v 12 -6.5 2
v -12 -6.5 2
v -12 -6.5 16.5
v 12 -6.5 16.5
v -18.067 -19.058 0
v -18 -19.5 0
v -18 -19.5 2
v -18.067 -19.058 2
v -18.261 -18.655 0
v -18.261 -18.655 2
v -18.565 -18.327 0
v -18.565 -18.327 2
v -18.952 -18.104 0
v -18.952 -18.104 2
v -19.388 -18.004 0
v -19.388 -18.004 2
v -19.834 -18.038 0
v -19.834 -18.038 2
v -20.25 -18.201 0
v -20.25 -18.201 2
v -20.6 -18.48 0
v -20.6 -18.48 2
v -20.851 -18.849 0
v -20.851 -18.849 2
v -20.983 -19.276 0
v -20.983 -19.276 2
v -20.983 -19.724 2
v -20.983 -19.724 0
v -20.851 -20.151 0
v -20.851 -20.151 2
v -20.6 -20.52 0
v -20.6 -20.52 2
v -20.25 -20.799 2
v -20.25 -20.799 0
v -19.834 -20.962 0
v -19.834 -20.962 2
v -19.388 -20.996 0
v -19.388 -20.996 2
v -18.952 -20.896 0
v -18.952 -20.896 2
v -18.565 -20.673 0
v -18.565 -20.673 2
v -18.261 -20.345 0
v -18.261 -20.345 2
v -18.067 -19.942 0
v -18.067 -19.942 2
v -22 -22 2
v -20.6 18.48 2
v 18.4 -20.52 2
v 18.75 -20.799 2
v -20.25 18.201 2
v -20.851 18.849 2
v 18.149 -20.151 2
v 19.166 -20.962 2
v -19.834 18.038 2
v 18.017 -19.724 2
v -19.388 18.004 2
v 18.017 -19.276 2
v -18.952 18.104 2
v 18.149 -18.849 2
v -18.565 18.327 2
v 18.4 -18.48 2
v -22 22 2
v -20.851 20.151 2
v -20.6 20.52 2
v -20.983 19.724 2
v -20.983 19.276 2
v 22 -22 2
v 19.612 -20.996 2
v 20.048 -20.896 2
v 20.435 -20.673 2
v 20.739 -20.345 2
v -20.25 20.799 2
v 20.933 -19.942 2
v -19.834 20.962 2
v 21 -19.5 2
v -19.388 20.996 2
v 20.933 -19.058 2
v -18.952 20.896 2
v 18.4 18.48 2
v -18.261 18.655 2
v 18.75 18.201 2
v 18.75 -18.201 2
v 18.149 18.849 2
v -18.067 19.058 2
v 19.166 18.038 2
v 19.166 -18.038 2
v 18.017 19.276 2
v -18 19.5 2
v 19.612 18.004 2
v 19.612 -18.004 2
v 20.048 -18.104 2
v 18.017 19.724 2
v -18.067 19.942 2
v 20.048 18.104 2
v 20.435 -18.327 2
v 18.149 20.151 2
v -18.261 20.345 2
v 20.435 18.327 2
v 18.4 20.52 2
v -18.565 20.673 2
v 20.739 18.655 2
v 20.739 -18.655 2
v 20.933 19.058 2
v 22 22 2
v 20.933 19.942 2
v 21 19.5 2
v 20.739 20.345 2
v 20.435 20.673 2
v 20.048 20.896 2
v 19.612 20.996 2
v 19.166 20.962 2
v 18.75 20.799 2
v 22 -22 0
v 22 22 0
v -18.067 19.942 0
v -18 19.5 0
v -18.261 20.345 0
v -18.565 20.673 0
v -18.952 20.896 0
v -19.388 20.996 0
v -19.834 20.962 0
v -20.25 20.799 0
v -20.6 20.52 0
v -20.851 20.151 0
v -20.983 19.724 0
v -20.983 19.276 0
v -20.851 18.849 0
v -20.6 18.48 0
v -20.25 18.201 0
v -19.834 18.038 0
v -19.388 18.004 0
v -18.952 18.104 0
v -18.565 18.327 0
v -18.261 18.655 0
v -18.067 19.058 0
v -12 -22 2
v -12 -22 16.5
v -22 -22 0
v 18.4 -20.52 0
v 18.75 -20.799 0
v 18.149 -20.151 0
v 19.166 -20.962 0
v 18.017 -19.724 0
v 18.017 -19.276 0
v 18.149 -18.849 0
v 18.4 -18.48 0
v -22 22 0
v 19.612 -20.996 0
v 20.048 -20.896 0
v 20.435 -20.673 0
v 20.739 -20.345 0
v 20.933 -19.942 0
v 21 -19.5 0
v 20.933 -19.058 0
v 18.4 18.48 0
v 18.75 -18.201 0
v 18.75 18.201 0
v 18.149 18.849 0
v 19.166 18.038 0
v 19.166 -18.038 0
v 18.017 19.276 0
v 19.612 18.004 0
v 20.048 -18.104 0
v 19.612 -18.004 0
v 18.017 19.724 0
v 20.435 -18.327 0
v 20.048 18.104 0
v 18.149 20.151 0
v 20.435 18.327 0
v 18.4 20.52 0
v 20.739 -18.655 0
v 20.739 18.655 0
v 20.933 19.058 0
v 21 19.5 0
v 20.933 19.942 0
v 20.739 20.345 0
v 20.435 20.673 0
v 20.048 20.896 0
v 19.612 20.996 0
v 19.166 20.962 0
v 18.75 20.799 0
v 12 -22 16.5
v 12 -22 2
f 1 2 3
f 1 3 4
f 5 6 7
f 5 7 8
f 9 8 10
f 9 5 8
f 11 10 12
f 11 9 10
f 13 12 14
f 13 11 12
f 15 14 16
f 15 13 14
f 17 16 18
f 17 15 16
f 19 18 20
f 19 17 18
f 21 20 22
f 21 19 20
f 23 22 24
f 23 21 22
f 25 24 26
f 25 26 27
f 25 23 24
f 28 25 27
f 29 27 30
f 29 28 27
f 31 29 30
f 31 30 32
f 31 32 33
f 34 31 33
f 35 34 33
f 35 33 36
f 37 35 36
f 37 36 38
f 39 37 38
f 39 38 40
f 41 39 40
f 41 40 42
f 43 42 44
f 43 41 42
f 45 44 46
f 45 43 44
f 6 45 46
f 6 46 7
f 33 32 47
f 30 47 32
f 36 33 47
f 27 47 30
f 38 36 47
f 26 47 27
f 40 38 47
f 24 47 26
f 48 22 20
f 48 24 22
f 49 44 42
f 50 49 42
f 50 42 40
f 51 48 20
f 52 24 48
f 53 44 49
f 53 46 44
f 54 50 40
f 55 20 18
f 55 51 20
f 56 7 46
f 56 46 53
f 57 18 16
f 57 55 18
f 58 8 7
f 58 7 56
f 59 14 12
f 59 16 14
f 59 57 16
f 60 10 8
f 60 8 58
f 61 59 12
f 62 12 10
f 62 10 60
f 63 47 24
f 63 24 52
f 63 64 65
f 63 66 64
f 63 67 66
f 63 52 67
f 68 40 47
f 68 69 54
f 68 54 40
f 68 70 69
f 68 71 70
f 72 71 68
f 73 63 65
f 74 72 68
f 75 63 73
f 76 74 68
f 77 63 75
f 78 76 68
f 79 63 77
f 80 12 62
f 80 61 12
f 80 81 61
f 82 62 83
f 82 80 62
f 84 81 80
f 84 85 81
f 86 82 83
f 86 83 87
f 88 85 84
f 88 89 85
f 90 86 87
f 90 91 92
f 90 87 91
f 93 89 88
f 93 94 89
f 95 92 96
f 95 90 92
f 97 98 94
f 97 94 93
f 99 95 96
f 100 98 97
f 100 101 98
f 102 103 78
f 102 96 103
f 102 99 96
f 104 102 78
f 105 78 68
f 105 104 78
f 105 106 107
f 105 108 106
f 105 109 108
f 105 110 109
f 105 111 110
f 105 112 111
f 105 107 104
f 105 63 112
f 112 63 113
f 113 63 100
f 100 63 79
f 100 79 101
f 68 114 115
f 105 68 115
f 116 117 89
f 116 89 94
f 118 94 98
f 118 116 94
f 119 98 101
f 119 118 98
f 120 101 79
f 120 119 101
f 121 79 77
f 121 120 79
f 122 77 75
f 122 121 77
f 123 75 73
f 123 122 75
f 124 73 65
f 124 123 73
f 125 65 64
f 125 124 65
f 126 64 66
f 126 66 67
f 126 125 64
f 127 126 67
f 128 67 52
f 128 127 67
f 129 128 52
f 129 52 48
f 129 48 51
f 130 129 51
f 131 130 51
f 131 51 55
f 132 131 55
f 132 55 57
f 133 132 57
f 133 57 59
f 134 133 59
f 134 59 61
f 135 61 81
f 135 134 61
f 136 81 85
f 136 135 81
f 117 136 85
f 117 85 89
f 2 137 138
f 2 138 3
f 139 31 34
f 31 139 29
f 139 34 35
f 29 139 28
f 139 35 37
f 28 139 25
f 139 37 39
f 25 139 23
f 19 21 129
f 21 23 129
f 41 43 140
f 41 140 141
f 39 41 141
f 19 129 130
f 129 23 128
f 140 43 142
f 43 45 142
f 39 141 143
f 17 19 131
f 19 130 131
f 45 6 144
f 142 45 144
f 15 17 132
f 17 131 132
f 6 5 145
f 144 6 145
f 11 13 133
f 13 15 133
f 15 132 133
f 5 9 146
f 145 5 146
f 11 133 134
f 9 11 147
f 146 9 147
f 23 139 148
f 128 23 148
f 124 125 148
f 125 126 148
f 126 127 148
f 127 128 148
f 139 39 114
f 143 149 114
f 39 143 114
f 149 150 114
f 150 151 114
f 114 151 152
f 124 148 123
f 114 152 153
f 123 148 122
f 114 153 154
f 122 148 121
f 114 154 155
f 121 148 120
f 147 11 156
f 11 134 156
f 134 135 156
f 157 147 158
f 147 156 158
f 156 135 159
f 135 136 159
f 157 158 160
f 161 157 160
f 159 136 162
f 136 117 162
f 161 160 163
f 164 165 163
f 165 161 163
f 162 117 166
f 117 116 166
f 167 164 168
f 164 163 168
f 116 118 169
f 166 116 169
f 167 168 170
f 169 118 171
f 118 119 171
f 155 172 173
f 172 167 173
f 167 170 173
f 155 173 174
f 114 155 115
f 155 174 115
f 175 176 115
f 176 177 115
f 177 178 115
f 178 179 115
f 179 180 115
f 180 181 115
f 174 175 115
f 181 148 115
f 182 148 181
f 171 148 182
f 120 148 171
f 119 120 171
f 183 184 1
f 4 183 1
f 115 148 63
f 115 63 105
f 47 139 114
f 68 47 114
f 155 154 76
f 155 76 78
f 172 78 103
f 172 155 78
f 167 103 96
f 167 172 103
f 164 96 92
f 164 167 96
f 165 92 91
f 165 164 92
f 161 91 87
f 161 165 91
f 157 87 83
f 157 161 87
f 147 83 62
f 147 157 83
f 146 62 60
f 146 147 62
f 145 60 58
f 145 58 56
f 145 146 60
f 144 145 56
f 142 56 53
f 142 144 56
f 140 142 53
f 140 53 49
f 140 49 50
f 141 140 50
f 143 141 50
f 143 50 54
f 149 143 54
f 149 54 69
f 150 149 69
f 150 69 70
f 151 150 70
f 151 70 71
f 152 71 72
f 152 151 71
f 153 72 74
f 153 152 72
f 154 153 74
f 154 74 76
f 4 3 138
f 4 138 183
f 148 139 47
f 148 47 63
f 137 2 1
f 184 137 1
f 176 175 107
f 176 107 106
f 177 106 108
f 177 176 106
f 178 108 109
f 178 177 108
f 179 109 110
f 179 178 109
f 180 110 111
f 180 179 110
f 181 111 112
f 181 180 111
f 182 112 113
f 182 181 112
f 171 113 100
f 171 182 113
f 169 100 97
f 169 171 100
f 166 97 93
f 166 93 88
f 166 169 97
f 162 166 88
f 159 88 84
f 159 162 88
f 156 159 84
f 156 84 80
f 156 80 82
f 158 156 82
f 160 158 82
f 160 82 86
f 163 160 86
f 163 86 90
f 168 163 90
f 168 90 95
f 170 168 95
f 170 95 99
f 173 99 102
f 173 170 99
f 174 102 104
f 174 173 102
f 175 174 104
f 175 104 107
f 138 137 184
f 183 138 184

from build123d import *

# Parameters (mm, degrees)
CROQUIS1_W              = 44
CROQUIS1_H              = 44
CROQUIS1_R              = 1.5
SALIENTE_EXTRUIR1_DEPTH = 2
CROQUIS2_W              = 24
CROQUIS2_H              = 15.5
SALIENTE_EXTRUIR2_DEPTH = 14.5


with BuildPart() as part:
    # Croquis1 → Saliente-Extruir1 (new body)
    with BuildSketch(Plane.XY):
        Rectangle(CROQUIS1_W, CROQUIS1_H)
        with Locations((19.5, 19.5)):
            Circle(CROQUIS1_R, mode=Mode.SUBTRACT)
        with Locations((19.5, -19.5)):
            Circle(CROQUIS1_R, mode=Mode.SUBTRACT)
        with Locations((-19.5, -19.5)):
            Circle(CROQUIS1_R, mode=Mode.SUBTRACT)
        with Locations((-19.5, 19.5)):
            Circle(CROQUIS1_R, mode=Mode.SUBTRACT)
    extrude(amount=SALIENTE_EXTRUIR1_DEPTH)


with BuildPart() as body_2:
    # Croquis2 → Saliente-Extruir2 (new body)
    with BuildSketch(Plane.XY.offset(2)):
        with Locations((0, -14.25)):
            Rectangle(CROQUIS2_W, CROQUIS2_H)
    extrude(amount=SALIENTE_EXTRUIR2_DEPTH)


solid = Compound([part.part, body_2.part])
